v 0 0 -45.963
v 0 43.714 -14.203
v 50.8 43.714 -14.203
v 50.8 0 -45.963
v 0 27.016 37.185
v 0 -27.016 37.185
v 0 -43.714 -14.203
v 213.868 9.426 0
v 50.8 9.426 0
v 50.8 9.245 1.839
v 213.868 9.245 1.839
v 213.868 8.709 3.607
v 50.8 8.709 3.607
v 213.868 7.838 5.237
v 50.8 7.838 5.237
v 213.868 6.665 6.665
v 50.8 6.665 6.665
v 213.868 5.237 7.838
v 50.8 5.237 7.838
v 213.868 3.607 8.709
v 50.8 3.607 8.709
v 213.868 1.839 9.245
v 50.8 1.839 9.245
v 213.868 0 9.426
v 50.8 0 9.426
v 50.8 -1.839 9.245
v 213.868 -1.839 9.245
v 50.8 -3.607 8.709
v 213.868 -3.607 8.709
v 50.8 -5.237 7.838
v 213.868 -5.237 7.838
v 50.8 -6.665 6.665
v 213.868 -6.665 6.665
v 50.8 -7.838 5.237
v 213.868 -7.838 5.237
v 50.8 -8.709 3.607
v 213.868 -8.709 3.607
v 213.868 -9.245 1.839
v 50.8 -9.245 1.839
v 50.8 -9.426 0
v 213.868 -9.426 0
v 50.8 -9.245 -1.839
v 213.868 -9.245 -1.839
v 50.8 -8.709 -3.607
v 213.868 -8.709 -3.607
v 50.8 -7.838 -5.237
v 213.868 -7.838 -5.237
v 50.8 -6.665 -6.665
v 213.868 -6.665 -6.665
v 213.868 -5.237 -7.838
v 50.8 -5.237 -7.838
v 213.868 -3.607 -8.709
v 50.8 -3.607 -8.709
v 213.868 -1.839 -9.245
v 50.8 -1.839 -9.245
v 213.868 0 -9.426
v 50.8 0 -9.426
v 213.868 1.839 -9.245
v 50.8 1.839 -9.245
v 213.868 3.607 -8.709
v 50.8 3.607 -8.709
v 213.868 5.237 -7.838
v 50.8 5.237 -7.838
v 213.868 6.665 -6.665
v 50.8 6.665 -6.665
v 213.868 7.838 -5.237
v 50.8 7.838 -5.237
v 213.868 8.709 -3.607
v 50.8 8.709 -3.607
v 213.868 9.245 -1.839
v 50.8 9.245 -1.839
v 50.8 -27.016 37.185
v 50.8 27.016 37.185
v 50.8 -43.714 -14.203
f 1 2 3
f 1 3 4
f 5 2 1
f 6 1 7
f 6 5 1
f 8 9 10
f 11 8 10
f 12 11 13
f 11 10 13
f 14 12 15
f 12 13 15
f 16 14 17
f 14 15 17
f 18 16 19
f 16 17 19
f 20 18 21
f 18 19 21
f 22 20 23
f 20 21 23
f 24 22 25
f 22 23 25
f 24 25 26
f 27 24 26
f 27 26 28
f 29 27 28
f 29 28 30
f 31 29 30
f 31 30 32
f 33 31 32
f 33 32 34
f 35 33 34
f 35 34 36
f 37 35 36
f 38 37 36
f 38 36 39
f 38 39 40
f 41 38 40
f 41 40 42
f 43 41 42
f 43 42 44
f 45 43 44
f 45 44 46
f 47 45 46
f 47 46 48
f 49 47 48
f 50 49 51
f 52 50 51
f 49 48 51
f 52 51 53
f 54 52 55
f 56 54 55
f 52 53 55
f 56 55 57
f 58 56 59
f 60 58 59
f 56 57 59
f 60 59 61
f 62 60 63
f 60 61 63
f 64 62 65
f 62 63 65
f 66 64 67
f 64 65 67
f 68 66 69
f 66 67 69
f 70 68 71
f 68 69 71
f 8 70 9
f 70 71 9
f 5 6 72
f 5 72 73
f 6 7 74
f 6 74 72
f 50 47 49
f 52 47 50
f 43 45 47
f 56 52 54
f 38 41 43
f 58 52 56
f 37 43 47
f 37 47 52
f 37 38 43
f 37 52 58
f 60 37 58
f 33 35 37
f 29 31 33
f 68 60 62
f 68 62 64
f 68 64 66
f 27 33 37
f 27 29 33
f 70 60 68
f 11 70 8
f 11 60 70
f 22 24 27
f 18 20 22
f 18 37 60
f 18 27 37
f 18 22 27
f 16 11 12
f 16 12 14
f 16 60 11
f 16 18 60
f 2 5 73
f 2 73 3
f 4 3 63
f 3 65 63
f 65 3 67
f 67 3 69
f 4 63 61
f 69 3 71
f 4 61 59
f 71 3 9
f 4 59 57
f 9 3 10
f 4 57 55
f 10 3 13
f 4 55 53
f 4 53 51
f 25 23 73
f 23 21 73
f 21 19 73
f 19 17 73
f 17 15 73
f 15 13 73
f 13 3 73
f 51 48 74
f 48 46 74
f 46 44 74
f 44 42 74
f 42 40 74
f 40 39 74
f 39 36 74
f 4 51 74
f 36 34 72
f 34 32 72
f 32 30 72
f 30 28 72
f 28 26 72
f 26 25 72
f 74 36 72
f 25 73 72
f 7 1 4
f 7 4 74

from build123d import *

# Parameters (mm, degrees)
F0_R     = 9.42624
F1_DEPTH = 213.868
F3_DEPTH = 50.8


with BuildPart() as f1:
    # F0 (on Right) → F1 (new body)
    with BuildSketch(Plane.YZ):
        Circle(F0_R)
    extrude(amount=F1_DEPTH)

    # F2 (on face) → F3 (join)
    with BuildSketch(Plane(origin=(0, 0, 0), x_dir=(0, -1, 0), z_dir=(-1, 0, 0))):
        Polygon((27.016499, 37.185021), (-27.016499, 37.185021), (-43.713614, -14.203414), (0, -45.963213), (43.713614, -14.203414), align=None)
    extrude(amount=-F3_DEPTH)


solid = f1.part
